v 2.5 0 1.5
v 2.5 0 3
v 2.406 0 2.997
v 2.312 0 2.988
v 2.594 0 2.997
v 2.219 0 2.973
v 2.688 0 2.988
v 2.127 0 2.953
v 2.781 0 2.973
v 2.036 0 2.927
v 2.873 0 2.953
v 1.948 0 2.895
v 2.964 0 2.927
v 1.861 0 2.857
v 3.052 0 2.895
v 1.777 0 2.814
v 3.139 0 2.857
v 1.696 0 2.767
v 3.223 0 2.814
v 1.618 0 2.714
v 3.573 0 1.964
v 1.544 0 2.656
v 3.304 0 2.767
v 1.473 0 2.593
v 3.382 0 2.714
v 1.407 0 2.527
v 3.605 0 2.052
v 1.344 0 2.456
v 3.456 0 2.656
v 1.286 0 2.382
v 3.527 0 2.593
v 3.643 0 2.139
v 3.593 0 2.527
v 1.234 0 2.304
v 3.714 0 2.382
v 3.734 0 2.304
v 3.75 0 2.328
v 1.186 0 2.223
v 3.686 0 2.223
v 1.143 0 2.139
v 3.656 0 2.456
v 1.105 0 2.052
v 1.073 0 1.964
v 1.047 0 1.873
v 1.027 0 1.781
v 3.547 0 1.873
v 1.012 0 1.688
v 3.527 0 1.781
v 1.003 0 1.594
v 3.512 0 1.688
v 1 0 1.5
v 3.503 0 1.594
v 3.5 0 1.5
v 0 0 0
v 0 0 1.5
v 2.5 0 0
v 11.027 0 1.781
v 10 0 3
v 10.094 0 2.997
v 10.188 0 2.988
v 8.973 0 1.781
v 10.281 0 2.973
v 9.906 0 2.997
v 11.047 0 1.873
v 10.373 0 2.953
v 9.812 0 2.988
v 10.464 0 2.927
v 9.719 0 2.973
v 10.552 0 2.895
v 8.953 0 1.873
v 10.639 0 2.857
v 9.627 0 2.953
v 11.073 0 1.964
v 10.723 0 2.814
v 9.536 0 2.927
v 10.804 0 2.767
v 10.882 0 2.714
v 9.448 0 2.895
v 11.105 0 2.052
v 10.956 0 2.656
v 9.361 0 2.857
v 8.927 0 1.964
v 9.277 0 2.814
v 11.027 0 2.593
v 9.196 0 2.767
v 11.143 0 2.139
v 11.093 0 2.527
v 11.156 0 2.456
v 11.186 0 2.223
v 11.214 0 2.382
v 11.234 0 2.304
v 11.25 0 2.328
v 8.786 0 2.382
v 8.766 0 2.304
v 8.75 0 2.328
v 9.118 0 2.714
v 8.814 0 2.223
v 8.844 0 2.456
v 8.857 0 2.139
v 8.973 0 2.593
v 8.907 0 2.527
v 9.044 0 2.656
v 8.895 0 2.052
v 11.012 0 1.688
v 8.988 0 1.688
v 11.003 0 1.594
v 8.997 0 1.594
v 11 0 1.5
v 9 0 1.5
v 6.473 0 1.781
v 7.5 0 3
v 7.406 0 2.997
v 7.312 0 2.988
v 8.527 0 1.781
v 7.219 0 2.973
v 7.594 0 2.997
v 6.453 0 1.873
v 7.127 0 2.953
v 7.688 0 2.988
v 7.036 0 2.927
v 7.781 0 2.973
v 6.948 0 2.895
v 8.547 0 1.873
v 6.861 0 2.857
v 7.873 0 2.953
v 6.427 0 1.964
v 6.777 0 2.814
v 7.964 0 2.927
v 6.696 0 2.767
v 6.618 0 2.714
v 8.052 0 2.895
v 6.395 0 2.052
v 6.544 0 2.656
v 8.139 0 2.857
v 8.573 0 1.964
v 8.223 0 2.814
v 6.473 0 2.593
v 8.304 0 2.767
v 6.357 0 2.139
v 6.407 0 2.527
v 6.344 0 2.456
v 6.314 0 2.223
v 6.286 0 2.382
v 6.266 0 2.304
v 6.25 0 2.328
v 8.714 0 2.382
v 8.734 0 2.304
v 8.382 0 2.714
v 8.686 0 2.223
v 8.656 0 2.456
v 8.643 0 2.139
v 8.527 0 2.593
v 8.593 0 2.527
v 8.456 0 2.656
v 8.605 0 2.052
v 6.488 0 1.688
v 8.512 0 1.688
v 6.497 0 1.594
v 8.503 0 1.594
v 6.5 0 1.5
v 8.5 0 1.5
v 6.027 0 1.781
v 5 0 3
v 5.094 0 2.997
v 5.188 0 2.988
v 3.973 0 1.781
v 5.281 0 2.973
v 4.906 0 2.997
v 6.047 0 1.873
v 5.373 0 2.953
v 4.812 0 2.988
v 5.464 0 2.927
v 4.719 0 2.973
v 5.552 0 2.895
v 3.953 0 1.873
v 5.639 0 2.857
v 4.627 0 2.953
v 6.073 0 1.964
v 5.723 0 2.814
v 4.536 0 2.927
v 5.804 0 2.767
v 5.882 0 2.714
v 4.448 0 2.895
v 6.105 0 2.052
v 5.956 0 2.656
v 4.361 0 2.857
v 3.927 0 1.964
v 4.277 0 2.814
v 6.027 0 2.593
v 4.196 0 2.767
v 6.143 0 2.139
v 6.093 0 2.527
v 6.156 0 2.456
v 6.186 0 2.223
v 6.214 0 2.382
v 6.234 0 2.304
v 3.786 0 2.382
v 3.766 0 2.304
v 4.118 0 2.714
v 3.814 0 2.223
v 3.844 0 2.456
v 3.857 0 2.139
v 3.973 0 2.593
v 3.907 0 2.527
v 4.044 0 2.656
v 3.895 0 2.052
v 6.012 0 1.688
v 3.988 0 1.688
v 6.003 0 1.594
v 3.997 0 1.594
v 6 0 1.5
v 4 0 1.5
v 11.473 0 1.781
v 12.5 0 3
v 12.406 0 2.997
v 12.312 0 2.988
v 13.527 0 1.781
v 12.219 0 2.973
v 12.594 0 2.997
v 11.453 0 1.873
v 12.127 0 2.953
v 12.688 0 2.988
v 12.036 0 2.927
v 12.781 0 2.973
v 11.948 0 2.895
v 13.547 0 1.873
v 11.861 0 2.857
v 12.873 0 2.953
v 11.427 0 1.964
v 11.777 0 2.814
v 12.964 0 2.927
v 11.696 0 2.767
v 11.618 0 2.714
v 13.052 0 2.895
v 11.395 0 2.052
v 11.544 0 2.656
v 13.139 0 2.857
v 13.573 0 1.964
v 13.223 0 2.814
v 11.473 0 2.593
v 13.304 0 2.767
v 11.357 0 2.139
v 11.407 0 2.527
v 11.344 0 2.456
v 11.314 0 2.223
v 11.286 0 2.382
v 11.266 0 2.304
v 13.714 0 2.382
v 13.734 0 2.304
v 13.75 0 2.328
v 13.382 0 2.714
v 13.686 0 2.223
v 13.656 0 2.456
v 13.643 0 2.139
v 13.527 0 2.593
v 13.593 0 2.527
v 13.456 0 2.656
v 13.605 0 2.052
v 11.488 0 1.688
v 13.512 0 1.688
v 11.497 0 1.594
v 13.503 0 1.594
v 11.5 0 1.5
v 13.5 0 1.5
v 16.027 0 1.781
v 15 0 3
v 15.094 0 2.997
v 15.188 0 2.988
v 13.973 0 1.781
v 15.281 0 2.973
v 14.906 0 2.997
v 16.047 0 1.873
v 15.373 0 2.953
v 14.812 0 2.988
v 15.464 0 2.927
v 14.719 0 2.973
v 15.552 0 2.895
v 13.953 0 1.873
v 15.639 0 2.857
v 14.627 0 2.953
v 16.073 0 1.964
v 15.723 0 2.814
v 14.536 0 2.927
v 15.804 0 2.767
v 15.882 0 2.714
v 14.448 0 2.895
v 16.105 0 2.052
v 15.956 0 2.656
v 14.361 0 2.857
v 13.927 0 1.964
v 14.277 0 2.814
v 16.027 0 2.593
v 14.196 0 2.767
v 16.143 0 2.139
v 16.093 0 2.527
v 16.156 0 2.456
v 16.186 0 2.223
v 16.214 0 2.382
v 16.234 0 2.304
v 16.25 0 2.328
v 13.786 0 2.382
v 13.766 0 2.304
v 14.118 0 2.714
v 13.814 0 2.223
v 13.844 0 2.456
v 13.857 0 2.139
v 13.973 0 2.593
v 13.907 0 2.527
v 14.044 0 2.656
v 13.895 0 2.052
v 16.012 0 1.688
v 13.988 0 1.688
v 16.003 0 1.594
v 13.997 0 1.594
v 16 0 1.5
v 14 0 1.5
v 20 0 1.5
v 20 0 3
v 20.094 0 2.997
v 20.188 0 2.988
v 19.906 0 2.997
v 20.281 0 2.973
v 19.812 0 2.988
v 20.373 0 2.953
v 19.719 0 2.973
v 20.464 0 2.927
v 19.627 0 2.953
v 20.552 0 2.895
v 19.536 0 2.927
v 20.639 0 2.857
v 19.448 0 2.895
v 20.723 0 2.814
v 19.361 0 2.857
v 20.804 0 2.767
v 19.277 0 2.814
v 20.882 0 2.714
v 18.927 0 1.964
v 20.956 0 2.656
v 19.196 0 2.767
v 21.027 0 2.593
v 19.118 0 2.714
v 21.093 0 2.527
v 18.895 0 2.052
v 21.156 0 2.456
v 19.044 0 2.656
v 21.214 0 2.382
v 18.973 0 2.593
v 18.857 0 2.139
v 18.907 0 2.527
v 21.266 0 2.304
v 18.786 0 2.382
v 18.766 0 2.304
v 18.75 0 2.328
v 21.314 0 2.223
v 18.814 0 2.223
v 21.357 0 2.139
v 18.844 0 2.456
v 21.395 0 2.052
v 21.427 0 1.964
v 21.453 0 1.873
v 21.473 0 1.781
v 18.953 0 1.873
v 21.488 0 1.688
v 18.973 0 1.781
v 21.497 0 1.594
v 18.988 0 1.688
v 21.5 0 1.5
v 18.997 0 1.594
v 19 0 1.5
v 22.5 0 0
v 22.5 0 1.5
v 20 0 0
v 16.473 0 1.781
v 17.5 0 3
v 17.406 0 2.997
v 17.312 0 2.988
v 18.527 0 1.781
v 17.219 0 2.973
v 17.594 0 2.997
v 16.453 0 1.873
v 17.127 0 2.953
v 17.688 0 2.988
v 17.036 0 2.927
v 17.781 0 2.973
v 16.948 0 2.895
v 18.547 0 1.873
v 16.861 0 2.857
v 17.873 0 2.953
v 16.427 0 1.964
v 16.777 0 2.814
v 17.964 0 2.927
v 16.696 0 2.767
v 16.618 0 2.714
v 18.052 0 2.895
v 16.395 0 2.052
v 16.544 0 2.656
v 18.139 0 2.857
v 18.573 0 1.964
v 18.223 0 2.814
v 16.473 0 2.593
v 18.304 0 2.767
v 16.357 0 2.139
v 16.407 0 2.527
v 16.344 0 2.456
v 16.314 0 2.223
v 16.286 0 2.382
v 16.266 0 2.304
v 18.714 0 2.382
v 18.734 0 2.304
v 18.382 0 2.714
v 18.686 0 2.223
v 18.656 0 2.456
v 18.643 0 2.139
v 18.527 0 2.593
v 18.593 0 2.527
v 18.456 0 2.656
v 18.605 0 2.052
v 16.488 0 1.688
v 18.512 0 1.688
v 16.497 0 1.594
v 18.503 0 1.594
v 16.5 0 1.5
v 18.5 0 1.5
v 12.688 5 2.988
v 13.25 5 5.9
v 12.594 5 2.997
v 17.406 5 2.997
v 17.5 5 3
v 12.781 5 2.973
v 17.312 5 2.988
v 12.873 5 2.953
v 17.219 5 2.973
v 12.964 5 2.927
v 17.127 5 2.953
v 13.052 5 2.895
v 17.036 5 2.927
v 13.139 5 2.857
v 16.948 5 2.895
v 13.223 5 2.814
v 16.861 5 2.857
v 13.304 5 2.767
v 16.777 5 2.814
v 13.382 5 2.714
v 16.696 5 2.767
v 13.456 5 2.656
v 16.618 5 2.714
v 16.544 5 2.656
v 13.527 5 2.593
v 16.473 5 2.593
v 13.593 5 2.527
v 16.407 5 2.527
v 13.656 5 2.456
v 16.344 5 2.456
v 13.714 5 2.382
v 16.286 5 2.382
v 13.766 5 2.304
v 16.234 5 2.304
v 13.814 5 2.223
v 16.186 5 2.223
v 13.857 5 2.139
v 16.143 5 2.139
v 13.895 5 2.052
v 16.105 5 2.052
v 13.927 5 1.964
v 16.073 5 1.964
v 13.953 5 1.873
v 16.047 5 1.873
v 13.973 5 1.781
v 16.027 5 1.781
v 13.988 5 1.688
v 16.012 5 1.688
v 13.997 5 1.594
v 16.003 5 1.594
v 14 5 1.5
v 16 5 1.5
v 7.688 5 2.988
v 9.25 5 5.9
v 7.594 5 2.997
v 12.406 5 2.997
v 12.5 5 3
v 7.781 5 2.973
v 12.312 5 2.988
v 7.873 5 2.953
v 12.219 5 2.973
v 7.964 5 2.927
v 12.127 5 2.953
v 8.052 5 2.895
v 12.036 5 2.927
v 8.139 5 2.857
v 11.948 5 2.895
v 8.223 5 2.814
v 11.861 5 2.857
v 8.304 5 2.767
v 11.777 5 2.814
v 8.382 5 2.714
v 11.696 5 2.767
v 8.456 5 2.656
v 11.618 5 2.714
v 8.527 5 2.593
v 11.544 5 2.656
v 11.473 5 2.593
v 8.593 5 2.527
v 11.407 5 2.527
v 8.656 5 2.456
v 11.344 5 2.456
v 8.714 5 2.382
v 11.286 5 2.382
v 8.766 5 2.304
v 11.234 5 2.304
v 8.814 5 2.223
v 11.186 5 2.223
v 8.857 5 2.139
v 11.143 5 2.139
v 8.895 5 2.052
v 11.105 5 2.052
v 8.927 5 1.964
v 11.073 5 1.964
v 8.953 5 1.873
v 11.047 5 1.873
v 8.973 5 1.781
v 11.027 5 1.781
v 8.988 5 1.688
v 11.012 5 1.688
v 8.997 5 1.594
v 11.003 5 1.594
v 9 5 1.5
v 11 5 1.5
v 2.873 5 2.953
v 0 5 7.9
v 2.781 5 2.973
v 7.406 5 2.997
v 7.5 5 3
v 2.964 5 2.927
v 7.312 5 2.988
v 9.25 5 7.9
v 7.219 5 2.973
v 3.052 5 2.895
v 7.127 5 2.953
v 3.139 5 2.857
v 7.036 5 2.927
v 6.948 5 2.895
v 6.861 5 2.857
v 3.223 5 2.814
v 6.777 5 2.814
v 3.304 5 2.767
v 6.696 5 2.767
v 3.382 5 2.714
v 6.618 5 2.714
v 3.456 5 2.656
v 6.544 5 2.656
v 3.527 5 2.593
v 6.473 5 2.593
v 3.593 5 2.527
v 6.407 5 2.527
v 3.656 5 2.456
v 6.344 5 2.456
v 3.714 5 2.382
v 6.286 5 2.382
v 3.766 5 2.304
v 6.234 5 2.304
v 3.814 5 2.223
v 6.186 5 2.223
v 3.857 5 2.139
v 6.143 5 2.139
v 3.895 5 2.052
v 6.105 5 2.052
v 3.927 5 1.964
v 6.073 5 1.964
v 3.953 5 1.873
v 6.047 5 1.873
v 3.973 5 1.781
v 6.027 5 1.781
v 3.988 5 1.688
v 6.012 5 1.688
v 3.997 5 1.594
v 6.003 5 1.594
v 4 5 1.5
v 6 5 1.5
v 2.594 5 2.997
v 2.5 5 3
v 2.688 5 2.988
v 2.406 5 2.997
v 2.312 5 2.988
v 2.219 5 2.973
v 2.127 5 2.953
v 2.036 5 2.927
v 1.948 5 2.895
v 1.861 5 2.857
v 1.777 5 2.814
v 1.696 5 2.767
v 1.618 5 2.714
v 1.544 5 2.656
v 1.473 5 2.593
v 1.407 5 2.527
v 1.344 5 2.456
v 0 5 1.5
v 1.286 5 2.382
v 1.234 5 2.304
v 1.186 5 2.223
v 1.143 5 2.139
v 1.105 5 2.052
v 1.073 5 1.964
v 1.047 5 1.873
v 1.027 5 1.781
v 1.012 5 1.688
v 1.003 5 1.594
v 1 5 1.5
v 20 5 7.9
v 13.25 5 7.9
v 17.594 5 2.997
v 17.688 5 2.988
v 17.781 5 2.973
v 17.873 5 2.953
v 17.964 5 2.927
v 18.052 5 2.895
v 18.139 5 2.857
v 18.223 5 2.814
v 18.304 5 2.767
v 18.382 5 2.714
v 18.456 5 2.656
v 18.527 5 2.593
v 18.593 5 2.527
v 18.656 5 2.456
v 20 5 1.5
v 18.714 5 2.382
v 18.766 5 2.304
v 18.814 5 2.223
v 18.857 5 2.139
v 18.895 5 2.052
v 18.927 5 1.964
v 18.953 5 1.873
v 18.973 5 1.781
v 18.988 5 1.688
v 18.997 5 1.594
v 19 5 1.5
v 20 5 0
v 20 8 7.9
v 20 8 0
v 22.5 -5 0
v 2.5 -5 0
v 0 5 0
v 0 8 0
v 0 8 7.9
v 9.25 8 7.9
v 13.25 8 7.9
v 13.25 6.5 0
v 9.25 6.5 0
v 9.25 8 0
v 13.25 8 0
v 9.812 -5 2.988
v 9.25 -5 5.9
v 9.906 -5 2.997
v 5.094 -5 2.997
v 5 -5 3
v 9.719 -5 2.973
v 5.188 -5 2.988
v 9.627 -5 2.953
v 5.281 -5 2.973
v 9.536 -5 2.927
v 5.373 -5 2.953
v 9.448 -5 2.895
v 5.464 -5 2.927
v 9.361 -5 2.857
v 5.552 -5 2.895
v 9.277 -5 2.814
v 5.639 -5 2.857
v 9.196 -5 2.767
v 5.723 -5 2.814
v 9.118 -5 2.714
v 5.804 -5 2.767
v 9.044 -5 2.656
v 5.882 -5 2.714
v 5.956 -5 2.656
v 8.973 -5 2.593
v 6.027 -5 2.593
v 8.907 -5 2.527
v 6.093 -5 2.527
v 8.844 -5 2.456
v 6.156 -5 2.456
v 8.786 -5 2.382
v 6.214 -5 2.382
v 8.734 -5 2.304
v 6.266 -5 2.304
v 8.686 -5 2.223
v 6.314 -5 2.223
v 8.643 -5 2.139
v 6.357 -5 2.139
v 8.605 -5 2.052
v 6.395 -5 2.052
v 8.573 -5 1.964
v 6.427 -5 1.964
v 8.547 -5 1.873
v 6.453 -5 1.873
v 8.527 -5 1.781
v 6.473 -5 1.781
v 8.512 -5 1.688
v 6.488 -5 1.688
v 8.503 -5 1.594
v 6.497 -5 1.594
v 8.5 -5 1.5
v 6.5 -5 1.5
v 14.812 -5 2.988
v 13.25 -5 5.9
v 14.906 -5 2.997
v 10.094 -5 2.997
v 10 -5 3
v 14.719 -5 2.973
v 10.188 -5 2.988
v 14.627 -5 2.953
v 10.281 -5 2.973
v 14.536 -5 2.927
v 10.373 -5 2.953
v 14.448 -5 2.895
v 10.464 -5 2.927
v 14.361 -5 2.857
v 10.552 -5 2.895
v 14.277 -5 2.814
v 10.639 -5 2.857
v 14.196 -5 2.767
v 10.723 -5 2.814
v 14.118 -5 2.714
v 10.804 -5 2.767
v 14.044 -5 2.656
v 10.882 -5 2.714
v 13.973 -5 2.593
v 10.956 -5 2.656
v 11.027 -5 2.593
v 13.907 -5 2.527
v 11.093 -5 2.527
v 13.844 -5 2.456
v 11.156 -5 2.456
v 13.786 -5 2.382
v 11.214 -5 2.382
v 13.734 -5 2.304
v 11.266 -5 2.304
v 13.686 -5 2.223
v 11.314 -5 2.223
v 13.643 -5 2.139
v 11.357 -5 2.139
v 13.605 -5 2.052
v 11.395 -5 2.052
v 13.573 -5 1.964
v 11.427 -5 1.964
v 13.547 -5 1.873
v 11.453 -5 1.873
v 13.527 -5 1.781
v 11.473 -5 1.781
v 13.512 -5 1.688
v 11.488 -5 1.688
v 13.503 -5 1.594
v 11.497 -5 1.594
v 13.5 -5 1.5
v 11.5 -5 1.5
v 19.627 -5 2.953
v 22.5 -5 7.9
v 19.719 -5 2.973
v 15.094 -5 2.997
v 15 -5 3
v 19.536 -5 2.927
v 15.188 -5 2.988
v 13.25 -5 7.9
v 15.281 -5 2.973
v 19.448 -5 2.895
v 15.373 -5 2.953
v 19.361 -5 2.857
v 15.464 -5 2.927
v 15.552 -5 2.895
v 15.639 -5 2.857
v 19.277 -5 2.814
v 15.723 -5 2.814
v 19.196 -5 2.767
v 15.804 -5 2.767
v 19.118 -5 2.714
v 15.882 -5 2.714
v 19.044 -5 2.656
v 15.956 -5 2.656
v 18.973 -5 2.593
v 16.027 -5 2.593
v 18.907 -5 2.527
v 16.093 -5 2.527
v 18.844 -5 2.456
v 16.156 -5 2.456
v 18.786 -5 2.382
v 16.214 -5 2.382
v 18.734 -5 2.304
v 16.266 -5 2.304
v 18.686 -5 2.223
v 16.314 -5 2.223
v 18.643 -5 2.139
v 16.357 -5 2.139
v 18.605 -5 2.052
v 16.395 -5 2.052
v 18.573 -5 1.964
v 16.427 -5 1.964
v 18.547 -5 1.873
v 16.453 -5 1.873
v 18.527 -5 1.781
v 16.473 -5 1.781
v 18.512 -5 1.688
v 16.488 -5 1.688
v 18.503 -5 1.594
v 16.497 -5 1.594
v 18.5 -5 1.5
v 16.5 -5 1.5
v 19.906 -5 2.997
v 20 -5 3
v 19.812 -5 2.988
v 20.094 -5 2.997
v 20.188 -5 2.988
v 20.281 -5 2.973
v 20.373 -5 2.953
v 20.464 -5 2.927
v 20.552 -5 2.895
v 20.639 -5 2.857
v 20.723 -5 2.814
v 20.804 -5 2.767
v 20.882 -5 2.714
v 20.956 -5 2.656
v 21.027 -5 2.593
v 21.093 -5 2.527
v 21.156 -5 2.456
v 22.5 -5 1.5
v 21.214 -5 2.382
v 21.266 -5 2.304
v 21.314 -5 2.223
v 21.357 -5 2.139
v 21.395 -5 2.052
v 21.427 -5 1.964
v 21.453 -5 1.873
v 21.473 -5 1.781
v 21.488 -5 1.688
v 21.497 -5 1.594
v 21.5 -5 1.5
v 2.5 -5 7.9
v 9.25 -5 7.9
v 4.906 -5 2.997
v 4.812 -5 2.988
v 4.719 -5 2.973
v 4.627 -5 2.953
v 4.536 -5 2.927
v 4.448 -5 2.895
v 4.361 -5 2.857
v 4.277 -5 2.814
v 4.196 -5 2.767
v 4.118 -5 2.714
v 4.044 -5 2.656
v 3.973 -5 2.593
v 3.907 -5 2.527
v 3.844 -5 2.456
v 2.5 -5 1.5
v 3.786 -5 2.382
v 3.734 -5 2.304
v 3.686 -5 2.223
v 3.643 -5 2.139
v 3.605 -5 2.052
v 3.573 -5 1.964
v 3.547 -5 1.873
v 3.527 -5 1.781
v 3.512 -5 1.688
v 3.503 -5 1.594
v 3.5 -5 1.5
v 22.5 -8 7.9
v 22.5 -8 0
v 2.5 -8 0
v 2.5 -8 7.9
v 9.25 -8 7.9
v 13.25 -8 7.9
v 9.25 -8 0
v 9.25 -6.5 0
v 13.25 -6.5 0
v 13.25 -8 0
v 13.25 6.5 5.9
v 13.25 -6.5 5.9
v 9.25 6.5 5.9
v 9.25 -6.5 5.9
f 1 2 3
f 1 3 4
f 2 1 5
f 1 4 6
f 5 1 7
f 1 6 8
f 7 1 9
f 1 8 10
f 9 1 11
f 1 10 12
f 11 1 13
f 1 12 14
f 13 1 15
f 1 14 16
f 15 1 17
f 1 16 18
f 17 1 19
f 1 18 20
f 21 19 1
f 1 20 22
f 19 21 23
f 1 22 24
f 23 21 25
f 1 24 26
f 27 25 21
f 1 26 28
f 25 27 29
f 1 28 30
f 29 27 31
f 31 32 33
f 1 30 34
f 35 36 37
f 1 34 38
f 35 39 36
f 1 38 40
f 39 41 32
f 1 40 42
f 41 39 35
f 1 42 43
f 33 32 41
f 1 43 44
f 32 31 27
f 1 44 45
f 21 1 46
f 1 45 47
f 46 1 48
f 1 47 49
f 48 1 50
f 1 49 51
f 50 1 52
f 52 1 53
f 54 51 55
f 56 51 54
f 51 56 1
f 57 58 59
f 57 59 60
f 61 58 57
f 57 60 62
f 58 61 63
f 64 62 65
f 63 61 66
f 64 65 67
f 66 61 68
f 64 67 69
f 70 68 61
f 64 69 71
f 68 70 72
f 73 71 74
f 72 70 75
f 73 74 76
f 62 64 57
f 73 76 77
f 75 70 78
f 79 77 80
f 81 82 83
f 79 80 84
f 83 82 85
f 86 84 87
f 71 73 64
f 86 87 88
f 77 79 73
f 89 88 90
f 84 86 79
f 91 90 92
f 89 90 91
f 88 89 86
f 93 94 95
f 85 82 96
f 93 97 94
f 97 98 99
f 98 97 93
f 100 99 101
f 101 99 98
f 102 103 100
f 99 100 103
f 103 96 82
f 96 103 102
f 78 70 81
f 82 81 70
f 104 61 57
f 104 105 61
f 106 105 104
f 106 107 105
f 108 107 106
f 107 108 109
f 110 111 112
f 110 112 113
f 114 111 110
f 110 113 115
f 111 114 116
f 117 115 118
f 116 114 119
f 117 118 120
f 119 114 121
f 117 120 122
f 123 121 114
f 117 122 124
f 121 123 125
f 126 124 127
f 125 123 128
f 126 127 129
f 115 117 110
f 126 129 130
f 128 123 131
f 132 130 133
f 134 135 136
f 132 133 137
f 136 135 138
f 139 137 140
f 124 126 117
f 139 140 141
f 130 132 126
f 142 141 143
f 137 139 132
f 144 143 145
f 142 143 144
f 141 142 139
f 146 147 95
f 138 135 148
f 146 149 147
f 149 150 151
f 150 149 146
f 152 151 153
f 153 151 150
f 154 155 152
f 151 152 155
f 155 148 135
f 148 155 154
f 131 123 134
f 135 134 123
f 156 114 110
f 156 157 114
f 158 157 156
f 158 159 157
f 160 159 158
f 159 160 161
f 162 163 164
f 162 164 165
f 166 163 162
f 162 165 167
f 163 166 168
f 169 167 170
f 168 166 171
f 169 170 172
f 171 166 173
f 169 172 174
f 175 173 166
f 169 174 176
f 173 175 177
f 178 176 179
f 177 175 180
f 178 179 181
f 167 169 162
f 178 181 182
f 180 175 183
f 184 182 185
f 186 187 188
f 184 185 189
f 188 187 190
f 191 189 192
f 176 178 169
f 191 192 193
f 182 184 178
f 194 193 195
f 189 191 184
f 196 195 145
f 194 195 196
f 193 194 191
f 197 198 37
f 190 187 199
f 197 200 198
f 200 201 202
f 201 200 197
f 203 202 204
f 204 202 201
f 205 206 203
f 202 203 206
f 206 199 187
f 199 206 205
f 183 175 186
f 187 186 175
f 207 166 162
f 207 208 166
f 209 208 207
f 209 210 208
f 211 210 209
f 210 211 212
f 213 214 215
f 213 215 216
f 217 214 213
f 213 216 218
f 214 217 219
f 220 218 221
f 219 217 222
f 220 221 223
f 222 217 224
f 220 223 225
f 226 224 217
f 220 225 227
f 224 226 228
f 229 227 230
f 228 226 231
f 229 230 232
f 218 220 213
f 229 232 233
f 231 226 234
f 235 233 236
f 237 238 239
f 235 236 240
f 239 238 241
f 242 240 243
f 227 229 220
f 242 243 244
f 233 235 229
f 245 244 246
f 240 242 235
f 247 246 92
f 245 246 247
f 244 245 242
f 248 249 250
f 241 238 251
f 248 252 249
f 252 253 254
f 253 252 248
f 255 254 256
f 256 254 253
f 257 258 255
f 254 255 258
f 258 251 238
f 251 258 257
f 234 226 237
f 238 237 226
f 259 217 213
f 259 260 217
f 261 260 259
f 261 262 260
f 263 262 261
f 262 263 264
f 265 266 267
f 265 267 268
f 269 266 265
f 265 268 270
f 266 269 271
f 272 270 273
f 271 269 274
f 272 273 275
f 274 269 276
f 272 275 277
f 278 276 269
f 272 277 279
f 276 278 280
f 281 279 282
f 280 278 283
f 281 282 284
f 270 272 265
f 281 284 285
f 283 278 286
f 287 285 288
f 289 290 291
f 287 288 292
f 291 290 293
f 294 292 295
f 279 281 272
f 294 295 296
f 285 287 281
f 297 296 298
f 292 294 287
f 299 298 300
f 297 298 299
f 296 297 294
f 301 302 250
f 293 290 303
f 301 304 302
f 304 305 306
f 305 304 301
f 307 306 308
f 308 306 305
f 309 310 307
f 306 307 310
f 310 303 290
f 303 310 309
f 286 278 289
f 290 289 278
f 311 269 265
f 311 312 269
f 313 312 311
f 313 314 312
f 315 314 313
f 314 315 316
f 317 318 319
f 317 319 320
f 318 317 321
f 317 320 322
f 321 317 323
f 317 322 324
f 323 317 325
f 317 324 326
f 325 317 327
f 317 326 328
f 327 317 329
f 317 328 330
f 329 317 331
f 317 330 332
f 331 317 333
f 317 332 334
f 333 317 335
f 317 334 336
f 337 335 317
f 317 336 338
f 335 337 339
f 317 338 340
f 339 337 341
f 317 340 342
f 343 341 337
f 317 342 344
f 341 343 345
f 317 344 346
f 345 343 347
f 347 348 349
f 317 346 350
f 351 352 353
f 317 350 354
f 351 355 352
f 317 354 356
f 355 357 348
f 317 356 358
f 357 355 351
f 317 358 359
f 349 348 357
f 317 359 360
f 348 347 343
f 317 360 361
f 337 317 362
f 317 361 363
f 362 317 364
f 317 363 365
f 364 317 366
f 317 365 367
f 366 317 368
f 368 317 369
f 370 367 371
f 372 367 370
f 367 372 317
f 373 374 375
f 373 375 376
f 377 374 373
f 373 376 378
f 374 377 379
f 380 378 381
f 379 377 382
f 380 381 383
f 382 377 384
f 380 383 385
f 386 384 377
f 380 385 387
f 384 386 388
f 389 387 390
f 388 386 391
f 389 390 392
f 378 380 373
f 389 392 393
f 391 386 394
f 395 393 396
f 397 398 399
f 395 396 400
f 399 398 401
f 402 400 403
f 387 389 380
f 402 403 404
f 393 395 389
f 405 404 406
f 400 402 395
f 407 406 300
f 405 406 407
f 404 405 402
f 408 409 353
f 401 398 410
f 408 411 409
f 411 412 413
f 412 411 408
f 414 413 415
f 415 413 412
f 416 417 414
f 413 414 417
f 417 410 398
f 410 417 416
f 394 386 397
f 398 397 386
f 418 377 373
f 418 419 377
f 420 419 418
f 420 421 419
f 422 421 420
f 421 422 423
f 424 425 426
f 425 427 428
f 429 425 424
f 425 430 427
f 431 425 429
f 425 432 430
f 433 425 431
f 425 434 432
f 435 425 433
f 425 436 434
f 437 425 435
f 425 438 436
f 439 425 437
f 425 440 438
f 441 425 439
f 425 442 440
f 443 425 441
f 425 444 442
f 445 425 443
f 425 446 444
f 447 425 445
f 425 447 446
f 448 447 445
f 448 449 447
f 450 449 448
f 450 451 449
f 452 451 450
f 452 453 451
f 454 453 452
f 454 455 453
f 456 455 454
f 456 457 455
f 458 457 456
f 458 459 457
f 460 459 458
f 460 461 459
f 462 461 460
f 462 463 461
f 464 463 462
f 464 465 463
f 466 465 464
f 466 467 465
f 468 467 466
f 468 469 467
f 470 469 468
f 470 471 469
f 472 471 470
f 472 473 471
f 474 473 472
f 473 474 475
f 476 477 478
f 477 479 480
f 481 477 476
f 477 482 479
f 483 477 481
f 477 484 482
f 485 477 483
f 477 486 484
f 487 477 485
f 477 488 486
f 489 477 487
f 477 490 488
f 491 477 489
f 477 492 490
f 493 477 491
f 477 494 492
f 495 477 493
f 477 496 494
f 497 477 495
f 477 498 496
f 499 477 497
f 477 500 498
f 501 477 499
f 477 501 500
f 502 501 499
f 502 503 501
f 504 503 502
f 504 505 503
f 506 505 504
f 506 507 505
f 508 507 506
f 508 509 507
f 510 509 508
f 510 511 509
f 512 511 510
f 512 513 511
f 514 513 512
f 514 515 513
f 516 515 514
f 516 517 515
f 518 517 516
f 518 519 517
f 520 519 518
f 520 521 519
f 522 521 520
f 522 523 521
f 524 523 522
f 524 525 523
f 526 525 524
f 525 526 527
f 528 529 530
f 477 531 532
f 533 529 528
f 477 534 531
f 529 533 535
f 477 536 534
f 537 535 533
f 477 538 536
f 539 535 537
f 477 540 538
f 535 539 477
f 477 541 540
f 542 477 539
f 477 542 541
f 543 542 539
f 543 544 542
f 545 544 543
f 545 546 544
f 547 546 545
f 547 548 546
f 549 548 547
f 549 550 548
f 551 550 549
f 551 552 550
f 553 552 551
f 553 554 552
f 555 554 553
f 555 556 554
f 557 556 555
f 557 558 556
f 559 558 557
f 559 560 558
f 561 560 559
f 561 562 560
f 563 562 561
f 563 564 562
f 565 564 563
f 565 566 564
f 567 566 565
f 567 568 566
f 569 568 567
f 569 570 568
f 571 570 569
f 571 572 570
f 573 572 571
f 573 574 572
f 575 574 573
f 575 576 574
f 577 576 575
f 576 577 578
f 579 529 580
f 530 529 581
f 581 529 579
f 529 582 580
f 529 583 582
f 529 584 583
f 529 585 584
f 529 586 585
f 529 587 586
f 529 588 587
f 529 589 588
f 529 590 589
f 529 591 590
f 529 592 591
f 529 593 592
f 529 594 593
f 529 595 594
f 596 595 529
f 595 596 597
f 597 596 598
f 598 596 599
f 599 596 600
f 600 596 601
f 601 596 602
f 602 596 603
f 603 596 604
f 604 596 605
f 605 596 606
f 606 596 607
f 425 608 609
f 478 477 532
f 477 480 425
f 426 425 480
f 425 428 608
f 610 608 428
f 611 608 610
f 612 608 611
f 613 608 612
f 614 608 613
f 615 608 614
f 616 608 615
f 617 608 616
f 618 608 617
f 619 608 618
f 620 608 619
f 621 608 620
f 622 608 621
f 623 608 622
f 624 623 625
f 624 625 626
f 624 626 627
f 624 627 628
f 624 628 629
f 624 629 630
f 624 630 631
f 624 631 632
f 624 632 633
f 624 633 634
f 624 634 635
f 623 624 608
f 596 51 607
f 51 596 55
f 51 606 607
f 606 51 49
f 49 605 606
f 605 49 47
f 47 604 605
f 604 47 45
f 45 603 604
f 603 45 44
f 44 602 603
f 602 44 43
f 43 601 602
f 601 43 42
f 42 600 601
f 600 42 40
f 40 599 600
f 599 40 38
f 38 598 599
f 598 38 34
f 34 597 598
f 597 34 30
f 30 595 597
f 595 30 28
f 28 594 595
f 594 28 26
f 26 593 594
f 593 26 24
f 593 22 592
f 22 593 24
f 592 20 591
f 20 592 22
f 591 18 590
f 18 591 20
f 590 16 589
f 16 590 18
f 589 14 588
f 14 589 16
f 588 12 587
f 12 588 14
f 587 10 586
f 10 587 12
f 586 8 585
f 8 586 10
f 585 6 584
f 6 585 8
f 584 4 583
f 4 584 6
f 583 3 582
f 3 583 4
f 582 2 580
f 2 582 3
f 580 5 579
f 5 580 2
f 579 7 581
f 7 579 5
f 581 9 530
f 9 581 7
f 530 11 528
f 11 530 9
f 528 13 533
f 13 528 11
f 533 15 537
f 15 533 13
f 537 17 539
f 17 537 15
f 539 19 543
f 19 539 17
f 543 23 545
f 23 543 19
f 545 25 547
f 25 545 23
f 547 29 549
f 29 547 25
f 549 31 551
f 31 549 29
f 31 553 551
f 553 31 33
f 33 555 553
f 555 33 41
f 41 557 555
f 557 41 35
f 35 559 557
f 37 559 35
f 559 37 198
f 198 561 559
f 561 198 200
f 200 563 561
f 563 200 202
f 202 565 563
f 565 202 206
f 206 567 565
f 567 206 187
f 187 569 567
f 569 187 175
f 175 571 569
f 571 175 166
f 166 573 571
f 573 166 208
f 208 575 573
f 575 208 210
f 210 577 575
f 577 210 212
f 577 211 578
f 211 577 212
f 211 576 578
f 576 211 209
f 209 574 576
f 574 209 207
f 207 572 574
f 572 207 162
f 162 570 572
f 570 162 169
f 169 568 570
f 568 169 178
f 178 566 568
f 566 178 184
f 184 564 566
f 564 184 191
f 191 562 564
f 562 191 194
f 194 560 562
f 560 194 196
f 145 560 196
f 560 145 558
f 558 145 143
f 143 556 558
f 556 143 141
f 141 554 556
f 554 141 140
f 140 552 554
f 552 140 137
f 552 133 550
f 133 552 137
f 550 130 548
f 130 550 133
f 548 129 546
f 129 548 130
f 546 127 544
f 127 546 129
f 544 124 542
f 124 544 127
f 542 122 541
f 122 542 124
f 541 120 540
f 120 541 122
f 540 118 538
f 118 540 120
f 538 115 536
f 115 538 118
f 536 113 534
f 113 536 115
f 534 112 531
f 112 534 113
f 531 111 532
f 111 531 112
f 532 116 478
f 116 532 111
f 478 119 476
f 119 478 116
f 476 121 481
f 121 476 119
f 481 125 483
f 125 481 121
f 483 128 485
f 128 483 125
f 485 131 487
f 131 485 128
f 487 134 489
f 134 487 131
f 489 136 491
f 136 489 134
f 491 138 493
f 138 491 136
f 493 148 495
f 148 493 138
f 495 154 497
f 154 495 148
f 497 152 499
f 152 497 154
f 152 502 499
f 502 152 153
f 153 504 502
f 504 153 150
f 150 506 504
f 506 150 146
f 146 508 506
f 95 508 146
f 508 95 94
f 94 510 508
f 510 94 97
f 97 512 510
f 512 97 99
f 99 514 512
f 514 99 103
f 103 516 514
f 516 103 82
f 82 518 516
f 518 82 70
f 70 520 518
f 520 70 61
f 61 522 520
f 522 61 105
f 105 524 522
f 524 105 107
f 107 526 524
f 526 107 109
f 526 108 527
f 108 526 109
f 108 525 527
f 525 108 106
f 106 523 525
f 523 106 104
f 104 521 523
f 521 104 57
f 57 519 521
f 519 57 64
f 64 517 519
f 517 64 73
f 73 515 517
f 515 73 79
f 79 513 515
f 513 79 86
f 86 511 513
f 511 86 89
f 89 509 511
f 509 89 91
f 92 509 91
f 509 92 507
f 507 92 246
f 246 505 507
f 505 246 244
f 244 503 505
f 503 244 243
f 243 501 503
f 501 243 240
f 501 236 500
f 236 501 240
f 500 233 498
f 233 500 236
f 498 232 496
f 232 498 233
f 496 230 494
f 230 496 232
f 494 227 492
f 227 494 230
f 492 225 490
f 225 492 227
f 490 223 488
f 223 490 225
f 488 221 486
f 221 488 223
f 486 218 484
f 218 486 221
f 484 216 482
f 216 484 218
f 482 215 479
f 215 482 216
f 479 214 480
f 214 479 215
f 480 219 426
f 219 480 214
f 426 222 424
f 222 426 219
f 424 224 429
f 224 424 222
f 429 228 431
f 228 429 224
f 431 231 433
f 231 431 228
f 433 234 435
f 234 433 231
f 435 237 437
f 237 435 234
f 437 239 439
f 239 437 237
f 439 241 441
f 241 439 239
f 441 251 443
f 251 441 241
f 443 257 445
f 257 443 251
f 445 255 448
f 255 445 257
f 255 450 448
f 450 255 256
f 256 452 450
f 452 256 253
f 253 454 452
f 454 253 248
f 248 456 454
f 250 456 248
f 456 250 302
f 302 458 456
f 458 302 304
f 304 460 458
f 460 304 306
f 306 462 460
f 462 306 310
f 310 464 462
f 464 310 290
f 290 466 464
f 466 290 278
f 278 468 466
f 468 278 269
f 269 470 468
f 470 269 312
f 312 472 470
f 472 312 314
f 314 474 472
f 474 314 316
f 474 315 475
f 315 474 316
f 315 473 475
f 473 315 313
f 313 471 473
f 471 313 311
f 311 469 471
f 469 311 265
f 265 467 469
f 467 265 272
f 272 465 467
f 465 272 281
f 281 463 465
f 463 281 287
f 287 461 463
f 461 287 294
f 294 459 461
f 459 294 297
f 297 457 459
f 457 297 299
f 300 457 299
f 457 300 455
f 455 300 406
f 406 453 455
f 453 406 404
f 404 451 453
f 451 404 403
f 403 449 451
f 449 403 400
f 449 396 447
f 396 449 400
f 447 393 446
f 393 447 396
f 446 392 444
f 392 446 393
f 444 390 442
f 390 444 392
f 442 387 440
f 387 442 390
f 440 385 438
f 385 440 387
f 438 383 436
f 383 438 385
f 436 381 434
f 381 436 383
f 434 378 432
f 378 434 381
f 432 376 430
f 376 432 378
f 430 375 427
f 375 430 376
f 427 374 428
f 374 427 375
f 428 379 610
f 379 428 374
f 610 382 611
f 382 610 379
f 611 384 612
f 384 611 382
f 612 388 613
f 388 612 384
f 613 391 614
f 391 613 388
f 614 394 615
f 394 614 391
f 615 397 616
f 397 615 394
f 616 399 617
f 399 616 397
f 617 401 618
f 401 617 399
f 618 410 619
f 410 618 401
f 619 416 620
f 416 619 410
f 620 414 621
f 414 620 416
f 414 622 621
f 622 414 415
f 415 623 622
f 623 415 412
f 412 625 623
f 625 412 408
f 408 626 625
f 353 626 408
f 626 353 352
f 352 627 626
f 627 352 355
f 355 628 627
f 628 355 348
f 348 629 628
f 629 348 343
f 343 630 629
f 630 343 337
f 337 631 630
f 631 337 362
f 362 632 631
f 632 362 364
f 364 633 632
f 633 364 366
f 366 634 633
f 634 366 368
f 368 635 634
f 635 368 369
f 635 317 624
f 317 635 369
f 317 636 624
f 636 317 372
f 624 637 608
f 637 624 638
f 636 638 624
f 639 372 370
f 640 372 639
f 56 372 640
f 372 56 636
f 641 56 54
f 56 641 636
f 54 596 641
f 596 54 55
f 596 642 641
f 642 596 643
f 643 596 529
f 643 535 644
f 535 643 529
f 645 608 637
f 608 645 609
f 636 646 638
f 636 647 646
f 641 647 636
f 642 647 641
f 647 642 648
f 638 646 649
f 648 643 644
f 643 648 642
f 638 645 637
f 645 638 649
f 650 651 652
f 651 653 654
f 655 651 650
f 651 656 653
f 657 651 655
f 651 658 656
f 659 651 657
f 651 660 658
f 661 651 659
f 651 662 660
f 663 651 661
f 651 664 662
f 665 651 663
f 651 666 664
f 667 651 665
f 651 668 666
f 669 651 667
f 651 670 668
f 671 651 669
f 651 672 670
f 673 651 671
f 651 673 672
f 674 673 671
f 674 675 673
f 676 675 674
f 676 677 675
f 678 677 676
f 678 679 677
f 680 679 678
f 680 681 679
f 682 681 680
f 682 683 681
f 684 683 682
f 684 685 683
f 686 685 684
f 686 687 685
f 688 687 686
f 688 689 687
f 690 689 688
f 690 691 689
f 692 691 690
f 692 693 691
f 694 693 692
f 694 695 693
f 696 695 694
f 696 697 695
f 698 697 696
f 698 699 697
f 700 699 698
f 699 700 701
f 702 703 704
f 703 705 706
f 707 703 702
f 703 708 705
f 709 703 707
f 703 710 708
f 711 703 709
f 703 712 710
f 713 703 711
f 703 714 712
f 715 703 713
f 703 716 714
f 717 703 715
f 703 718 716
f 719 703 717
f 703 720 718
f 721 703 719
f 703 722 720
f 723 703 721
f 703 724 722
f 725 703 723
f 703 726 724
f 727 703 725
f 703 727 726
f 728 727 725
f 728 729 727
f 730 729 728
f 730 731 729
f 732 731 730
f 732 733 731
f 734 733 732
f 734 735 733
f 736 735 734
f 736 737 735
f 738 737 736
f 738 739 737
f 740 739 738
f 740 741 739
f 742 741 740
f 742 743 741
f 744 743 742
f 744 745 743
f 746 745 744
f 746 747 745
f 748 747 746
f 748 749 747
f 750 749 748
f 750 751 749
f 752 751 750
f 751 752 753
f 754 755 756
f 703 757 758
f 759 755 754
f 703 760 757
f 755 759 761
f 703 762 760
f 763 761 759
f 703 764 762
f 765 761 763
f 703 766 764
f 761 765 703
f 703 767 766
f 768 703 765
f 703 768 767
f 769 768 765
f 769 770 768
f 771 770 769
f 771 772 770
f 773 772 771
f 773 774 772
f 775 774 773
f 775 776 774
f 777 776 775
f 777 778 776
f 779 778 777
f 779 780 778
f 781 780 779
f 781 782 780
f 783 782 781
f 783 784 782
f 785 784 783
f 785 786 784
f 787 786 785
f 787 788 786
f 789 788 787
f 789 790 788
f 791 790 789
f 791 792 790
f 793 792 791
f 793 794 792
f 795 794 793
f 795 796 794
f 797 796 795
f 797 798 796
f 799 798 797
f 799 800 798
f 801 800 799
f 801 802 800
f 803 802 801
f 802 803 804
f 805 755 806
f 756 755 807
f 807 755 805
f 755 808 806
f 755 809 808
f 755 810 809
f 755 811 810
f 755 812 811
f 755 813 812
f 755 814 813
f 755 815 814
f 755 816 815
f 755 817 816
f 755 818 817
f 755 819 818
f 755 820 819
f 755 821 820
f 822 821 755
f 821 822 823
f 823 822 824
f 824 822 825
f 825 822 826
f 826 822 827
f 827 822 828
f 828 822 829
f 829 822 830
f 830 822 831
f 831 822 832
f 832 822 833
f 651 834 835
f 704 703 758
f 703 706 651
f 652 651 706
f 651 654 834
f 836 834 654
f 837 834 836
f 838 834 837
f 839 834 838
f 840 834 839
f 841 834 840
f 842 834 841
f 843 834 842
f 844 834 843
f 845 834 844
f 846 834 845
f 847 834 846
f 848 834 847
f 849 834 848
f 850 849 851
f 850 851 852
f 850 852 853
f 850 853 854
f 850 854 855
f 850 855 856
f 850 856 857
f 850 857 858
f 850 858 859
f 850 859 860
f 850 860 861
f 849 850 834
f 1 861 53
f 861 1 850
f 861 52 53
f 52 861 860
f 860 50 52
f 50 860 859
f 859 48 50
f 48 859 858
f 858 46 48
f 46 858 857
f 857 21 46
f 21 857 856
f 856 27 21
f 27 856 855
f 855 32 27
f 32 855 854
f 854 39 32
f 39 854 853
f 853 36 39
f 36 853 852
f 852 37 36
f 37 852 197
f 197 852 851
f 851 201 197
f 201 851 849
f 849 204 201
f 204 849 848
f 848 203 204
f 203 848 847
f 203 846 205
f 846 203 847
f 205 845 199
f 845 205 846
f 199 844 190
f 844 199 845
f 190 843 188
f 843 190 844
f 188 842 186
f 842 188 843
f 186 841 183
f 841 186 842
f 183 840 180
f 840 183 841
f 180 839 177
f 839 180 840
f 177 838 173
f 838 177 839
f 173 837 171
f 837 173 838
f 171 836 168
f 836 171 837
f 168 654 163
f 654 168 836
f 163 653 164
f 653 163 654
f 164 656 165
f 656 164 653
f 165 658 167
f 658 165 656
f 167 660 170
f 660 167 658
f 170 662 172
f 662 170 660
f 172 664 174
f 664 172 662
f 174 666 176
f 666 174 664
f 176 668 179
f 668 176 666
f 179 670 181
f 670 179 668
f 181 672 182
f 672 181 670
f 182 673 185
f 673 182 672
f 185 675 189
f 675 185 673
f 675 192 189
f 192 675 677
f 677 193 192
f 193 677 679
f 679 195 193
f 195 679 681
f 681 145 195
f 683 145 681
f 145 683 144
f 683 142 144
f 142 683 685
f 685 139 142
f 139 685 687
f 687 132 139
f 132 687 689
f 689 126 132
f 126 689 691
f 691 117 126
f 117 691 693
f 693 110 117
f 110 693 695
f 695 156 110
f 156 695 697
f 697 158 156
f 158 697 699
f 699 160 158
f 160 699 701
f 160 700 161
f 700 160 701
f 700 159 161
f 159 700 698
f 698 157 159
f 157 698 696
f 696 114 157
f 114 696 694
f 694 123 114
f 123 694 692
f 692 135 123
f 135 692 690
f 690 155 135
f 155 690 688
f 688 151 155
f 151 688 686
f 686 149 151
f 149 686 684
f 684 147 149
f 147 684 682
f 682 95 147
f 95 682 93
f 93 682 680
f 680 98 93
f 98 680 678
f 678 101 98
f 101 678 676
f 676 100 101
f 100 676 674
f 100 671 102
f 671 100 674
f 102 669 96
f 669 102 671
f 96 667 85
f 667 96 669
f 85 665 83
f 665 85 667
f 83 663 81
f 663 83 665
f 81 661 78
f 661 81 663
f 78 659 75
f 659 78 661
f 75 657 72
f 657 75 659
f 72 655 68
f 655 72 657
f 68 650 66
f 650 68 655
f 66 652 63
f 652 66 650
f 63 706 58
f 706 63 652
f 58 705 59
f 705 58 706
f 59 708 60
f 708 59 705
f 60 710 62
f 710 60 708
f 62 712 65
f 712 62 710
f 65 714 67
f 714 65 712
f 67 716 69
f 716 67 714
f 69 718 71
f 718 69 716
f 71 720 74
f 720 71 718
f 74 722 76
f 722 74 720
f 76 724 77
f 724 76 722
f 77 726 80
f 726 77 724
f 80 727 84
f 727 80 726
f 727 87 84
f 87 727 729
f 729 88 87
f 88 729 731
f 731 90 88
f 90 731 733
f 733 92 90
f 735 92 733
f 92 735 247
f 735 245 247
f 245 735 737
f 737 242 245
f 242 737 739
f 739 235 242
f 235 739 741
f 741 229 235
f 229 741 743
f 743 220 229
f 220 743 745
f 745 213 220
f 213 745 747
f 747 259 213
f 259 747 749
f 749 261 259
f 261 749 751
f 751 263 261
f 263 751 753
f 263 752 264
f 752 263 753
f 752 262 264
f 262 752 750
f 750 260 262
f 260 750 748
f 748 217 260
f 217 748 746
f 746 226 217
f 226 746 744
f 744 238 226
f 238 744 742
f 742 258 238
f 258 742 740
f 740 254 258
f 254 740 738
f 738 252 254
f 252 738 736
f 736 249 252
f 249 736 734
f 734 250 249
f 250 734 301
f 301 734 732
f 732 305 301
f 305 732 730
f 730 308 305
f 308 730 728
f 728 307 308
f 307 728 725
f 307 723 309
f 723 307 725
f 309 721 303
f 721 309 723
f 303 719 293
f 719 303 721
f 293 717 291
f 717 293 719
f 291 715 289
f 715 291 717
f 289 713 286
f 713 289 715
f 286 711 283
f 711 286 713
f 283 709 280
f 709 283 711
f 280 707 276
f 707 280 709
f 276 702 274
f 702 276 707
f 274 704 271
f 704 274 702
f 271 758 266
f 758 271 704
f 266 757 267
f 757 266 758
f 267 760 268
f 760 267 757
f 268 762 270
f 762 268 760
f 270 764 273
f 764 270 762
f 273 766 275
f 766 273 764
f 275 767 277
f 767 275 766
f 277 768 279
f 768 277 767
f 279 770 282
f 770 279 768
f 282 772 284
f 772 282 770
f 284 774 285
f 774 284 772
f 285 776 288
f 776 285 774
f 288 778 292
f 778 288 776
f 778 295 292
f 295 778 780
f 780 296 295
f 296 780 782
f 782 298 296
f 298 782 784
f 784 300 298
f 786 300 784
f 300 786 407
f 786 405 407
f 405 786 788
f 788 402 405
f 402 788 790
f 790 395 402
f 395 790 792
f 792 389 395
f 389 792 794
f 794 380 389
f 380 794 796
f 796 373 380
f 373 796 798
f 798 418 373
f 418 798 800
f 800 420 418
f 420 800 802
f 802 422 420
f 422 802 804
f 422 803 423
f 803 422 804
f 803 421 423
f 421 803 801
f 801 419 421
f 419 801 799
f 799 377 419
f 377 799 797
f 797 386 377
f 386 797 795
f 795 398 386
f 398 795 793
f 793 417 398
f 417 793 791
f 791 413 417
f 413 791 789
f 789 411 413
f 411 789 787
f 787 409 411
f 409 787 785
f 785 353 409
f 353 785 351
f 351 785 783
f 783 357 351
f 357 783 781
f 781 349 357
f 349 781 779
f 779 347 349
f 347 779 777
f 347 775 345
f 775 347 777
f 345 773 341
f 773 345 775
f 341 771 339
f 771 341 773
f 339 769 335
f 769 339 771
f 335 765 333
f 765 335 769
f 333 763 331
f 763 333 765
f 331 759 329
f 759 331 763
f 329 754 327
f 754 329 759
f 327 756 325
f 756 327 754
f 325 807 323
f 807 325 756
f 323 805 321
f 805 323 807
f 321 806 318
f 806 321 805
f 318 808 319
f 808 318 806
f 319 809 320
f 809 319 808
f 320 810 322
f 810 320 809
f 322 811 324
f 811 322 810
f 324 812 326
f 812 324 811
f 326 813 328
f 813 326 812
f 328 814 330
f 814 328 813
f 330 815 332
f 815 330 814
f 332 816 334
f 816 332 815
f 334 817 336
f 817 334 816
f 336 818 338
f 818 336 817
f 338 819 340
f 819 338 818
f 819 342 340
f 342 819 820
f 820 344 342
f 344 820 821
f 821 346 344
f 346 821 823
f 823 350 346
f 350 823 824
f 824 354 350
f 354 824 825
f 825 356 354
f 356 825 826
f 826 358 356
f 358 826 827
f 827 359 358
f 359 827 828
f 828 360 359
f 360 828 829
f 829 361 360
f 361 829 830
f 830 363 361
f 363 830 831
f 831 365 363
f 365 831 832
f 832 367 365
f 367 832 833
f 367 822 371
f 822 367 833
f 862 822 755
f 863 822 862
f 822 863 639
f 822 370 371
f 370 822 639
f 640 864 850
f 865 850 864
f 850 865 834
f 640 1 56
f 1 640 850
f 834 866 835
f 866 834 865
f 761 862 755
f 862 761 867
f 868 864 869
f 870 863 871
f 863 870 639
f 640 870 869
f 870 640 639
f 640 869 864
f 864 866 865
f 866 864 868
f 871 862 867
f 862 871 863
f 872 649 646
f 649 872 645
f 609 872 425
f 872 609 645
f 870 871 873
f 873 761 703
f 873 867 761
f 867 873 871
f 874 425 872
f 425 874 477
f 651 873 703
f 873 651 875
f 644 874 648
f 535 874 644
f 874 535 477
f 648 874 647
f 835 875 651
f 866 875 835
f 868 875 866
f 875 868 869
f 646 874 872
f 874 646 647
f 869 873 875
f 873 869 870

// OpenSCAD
$fn=100;
long_trou=3;
long_bosse=2;
long_totale=long_trou+long_bosse;

largeur_courroie=5;
hauteur_courroie=2.4;

epaisseur_plaque=1.5;

hauteur_maintien=4.2+2;

module dent() {
	difference() {
		square([long_totale,hauteur_courroie]);
		translate([long_totale/2,hauteur_courroie]) circle(d=long_trou);
	}
}
module dent_inverse() {
	difference() {
		square([long_totale,hauteur_courroie+epaisseur_plaque]);
		dent();
	}
}

module courroie_inverse(dents) {
	for(i=[0:dents-1])
		translate([i*long_totale,0,0])dent_inverse();
}

module cote() {
translate([0,0,hauteur_courroie+epaisseur_plaque]) rotate([-90,0,0])
	linear_extrude(height=largeur_courroie) courroie_inverse(4);
translate([0,largeur_courroie,0])
	cube([4*long_totale,3,hauteur_maintien+epaisseur_plaque+0.2]);
}
module piece() {
cote();
translate([0.5*long_totale,0])mirror([0,1,0]) cote();
}
difference() {
piece();
translate([2.25*long_totale,0,hauteur_maintien+epaisseur_plaque+0.2])
	#cube([4,30,4], center=true);
translate([2.25*long_totale,+largeur_courroie+3.5,hauteur_maintien+epaisseur_plaque+0.2])
	rotate([90,0,0])#cube([4,30,4], center=true);
translate([2.25*long_totale,-largeur_courroie-3.5,hauteur_maintien+epaisseur_plaque+0.2])
	rotate([90,0,0])#cube([4,30,4], center=true);
}
